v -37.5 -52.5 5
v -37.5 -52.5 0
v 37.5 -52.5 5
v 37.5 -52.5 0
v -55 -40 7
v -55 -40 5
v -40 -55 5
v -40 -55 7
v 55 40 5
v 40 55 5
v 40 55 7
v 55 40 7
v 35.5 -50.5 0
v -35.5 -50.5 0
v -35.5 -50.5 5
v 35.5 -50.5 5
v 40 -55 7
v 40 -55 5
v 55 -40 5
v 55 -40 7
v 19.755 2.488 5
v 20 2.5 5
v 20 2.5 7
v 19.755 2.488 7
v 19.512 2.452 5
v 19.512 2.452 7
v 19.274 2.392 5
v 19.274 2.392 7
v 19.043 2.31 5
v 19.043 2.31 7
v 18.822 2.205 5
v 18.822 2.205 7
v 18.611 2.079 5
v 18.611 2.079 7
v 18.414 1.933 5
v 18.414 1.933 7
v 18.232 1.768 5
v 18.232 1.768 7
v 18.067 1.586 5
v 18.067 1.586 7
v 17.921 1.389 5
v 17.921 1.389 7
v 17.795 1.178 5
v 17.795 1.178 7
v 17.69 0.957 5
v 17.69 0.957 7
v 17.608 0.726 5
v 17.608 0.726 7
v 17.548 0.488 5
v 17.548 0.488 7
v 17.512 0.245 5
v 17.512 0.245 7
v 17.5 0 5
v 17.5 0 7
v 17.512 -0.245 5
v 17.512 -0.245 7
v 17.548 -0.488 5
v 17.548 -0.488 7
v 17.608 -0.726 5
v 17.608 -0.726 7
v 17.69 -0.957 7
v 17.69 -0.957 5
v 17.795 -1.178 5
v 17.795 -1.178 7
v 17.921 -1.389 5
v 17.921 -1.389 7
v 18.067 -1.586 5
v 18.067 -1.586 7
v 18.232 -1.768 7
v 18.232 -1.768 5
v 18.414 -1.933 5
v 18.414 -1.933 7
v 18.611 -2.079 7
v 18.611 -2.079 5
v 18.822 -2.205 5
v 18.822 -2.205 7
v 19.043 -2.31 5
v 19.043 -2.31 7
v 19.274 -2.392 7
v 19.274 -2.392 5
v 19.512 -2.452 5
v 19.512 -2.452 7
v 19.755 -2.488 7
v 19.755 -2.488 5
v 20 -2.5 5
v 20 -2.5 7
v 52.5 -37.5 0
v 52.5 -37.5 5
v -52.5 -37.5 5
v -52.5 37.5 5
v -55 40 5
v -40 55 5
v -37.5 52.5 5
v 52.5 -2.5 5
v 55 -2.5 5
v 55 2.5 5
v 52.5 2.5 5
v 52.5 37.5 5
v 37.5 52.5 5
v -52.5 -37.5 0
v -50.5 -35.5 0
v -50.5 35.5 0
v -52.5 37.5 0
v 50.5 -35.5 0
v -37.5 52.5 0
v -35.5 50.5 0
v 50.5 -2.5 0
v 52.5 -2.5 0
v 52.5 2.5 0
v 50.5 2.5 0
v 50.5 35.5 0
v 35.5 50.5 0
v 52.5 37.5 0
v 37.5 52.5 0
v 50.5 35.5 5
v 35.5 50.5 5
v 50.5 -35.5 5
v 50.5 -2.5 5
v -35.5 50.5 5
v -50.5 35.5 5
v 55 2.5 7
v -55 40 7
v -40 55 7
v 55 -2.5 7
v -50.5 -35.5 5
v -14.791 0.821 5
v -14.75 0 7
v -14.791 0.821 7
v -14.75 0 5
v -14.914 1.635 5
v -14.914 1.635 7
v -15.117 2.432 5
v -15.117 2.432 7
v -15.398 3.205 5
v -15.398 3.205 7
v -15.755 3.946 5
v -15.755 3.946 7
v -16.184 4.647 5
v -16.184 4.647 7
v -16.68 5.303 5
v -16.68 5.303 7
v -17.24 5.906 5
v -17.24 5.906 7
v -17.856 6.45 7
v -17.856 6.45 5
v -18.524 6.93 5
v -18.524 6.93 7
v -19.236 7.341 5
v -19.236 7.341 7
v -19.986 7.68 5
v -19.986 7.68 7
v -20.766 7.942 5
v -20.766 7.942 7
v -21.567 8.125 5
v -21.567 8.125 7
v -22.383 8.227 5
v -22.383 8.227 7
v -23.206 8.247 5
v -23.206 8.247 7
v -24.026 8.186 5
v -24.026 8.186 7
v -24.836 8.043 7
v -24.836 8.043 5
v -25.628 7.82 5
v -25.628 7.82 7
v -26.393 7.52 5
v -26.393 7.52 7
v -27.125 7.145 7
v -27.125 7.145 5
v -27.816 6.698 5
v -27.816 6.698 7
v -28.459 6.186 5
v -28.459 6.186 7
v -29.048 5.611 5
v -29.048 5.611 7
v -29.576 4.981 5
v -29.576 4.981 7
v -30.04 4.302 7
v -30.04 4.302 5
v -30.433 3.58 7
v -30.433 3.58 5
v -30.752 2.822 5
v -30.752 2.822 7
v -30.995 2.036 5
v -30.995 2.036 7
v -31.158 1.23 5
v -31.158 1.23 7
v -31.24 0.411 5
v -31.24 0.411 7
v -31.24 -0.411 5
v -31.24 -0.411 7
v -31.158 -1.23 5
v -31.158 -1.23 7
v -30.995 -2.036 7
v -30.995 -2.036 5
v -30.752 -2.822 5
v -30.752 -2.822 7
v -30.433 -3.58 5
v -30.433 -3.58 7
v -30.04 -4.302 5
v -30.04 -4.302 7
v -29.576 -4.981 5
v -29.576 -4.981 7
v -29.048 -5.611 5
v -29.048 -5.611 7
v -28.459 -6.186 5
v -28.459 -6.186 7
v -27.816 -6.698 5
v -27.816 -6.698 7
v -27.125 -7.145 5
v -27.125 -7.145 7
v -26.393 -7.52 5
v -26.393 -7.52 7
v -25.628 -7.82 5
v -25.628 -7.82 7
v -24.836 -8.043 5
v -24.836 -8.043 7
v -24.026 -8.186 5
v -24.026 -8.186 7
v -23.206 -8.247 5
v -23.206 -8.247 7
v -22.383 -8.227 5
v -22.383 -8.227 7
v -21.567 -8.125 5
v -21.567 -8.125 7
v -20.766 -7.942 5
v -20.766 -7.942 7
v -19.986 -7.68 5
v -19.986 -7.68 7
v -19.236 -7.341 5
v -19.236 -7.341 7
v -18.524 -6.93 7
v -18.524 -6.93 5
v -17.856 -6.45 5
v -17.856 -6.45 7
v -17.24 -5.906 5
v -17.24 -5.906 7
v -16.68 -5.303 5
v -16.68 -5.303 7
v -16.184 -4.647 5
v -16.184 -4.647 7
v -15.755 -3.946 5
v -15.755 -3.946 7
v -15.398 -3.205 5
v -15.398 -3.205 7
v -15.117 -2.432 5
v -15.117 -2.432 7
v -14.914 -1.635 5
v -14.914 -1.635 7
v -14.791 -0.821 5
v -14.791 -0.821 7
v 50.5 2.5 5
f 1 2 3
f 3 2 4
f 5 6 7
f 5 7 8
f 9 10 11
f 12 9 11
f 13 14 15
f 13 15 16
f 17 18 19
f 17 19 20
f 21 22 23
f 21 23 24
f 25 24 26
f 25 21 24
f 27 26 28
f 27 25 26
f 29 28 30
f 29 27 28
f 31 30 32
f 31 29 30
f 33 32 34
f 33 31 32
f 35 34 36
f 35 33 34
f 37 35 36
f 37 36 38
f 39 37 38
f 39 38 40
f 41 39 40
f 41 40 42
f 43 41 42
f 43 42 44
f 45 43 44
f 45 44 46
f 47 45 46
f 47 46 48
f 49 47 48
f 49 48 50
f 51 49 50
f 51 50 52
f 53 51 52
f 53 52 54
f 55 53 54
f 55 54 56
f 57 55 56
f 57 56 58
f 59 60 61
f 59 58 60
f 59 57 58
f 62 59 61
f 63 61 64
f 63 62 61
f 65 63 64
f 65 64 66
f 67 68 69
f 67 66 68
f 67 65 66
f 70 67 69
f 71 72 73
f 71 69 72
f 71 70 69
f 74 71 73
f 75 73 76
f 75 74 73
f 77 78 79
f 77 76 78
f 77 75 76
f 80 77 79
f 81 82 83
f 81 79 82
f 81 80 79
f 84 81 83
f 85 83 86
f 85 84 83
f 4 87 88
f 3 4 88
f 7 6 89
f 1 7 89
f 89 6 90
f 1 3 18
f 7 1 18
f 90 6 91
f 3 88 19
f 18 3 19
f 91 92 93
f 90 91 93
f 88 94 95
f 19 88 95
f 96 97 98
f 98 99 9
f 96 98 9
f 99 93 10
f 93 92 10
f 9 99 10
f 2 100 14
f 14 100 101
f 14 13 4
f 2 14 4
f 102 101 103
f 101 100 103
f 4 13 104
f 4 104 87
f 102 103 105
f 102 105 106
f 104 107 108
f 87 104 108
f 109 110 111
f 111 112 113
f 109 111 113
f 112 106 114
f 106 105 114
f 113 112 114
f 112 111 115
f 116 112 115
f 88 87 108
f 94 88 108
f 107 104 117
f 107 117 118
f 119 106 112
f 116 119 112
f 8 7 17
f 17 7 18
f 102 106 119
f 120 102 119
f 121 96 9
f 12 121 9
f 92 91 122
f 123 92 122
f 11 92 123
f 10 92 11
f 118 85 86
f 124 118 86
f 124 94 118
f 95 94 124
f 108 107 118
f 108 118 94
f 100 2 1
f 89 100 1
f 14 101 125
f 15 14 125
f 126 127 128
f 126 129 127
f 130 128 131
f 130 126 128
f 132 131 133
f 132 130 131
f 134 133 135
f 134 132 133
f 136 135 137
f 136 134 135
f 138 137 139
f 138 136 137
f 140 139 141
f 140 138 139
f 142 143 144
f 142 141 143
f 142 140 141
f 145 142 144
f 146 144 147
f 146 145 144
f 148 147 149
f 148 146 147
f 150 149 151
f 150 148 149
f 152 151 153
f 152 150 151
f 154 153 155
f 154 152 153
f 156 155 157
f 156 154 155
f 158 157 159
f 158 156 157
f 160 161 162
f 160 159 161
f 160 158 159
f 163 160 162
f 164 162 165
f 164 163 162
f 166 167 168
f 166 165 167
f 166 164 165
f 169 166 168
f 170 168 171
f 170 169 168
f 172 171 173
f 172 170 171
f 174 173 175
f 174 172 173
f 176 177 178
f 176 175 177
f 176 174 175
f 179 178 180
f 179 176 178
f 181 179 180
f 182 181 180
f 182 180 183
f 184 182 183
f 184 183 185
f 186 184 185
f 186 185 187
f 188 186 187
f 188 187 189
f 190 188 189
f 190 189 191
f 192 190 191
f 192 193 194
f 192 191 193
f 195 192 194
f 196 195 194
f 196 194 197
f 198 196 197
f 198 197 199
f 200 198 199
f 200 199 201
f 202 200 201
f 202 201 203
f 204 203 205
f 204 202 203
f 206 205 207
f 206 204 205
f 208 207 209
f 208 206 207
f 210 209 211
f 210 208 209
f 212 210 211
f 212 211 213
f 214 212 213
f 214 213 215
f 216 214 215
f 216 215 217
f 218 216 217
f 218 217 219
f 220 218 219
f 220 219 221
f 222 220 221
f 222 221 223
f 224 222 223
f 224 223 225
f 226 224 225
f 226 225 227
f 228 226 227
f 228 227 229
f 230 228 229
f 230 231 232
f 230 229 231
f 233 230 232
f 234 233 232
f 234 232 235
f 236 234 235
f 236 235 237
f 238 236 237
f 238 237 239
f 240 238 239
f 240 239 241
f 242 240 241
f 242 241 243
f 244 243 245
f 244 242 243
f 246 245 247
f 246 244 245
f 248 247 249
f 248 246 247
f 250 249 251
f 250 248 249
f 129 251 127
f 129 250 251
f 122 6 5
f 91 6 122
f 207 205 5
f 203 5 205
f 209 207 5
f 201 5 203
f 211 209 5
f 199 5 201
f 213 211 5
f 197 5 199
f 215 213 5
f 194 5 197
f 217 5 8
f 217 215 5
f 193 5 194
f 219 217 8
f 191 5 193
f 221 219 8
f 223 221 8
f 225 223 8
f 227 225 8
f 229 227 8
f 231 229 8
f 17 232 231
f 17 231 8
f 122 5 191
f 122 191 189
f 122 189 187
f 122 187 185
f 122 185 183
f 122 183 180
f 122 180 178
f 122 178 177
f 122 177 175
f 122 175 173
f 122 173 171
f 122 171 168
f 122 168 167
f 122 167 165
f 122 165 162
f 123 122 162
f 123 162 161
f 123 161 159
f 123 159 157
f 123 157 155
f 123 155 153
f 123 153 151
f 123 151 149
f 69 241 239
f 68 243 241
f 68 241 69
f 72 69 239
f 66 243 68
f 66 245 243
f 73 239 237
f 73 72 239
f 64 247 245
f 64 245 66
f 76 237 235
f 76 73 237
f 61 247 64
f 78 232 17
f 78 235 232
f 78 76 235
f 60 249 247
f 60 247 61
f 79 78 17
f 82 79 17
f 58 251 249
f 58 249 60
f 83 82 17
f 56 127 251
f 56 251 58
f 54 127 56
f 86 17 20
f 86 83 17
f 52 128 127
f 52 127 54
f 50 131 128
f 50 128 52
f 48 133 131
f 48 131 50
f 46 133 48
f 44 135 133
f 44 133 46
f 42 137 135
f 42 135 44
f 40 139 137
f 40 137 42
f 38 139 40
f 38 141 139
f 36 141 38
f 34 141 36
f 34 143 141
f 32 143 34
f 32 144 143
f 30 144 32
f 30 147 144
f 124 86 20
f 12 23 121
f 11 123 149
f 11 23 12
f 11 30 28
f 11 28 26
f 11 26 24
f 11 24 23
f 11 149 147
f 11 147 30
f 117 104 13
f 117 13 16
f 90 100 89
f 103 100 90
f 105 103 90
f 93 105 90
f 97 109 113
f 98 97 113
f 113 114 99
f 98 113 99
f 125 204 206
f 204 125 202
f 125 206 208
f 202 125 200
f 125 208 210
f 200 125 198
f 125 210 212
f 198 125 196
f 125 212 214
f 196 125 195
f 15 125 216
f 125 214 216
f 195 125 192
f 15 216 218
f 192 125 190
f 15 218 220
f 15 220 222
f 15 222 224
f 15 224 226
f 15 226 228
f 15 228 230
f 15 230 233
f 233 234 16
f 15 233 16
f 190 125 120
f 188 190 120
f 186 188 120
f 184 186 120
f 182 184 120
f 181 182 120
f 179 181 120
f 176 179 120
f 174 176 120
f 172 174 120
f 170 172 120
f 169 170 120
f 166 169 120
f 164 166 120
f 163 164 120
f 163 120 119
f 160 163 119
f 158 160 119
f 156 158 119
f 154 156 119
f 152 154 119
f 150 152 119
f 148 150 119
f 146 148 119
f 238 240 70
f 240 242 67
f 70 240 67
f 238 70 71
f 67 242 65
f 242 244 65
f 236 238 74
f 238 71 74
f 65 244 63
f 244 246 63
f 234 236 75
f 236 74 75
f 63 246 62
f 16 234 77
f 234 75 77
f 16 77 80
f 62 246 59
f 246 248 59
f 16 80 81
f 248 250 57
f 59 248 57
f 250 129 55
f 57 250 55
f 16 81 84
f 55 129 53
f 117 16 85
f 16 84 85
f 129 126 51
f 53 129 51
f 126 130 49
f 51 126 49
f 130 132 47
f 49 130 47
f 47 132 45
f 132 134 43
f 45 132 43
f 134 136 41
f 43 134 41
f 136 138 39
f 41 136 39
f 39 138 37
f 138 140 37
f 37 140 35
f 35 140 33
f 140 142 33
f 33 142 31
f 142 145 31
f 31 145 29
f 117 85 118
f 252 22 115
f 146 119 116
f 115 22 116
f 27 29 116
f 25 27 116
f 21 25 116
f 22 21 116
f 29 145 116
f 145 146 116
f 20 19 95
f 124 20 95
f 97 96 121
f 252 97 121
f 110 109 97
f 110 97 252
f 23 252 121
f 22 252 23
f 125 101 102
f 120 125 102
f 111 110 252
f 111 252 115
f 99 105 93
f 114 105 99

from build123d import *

# Parameters (mm, degrees)
PAD004_DEPTH = 10
SKETCH003_R  = 8.25
PAD003_DEPTH = 10
SKETCH002_W  = 101
SKETCH002_H  = 101
PAD002_DEPTH = 5
SKETCH_W     = 105
SKETCH_H     = 105
PAD_DEPTH    = 5
SKETCH001_W  = 110
SKETCH001_H  = 110
PAD001_DEPTH = 2
CHAMFER_SIZE = 15


with BuildPart() as body003:
    # Sketch004 → Pad004 (new body)
    with BuildSketch(Plane.XY):
        with BuildLine():
            Line((60, -2.5), (60, 2.5))
            Line((60, 2.5), (20, 2.5))
            ThreePointArc((20, 2.5), (17.5, 0), (20, -2.5))
            Line((20, -2.5), (60, -2.5))
        make_face()
    extrude(amount=PAD004_DEPTH)


with BuildPart() as body002:
    # Sketch003 → Pad003 (new body)
    with BuildSketch(Plane.XY):
        with Locations((-23, 0)):
            Circle(SKETCH003_R)
    extrude(amount=PAD003_DEPTH)


with BuildPart() as body001:
    # Sketch002 → Pad002 (new body)
    with BuildSketch(Plane.XY):
        Rectangle(SKETCH002_W, SKETCH002_H)
    extrude(amount=PAD002_DEPTH)


with BuildPart() as chamfer_body:
    # Sketch → Pad (new body)
    with BuildSketch(Plane.XY):
        Rectangle(SKETCH_W, SKETCH_H)
    extrude(amount=PAD_DEPTH)

    # Sketch001 (on Face6 of Pad) → Pad001 (join)
    with BuildSketch(Plane.XY.offset(5)):
        Rectangle(SKETCH001_W, SKETCH001_H)
    extrude(amount=PAD001_DEPTH)

    # Cut: cut Body001
    add(body001.part, mode=Mode.SUBTRACT)

    # Cut001: cut Body002
    add(body002.part, mode=Mode.SUBTRACT)

    # Cut002: cut Body003
    add(body003.part, mode=Mode.SUBTRACT)

    # Chamfer
    chamfer_edges = [chamfer_body.edges().sort_by_distance(p)[0] for p in [
        (-55, 55, 6),
        (55, 55, 6),
        (-55, -55, 6),
        (55, -55, 6),
        (52.5, 52.5, 2.5),
        (-52.5, 52.5, 2.5),
        (-52.5, -52.5, 2.5),
        (52.5, -52.5, 2.5),
        (50.5, 50.5, 2.5),
        (50.5, -50.5, 2.5),
        (-50.5, 50.5, 2.5),
        (-50.5, -50.5, 2.5),
    ]]
    chamfer(chamfer_edges, length=CHAMFER_SIZE)


solid = chamfer_body.part
